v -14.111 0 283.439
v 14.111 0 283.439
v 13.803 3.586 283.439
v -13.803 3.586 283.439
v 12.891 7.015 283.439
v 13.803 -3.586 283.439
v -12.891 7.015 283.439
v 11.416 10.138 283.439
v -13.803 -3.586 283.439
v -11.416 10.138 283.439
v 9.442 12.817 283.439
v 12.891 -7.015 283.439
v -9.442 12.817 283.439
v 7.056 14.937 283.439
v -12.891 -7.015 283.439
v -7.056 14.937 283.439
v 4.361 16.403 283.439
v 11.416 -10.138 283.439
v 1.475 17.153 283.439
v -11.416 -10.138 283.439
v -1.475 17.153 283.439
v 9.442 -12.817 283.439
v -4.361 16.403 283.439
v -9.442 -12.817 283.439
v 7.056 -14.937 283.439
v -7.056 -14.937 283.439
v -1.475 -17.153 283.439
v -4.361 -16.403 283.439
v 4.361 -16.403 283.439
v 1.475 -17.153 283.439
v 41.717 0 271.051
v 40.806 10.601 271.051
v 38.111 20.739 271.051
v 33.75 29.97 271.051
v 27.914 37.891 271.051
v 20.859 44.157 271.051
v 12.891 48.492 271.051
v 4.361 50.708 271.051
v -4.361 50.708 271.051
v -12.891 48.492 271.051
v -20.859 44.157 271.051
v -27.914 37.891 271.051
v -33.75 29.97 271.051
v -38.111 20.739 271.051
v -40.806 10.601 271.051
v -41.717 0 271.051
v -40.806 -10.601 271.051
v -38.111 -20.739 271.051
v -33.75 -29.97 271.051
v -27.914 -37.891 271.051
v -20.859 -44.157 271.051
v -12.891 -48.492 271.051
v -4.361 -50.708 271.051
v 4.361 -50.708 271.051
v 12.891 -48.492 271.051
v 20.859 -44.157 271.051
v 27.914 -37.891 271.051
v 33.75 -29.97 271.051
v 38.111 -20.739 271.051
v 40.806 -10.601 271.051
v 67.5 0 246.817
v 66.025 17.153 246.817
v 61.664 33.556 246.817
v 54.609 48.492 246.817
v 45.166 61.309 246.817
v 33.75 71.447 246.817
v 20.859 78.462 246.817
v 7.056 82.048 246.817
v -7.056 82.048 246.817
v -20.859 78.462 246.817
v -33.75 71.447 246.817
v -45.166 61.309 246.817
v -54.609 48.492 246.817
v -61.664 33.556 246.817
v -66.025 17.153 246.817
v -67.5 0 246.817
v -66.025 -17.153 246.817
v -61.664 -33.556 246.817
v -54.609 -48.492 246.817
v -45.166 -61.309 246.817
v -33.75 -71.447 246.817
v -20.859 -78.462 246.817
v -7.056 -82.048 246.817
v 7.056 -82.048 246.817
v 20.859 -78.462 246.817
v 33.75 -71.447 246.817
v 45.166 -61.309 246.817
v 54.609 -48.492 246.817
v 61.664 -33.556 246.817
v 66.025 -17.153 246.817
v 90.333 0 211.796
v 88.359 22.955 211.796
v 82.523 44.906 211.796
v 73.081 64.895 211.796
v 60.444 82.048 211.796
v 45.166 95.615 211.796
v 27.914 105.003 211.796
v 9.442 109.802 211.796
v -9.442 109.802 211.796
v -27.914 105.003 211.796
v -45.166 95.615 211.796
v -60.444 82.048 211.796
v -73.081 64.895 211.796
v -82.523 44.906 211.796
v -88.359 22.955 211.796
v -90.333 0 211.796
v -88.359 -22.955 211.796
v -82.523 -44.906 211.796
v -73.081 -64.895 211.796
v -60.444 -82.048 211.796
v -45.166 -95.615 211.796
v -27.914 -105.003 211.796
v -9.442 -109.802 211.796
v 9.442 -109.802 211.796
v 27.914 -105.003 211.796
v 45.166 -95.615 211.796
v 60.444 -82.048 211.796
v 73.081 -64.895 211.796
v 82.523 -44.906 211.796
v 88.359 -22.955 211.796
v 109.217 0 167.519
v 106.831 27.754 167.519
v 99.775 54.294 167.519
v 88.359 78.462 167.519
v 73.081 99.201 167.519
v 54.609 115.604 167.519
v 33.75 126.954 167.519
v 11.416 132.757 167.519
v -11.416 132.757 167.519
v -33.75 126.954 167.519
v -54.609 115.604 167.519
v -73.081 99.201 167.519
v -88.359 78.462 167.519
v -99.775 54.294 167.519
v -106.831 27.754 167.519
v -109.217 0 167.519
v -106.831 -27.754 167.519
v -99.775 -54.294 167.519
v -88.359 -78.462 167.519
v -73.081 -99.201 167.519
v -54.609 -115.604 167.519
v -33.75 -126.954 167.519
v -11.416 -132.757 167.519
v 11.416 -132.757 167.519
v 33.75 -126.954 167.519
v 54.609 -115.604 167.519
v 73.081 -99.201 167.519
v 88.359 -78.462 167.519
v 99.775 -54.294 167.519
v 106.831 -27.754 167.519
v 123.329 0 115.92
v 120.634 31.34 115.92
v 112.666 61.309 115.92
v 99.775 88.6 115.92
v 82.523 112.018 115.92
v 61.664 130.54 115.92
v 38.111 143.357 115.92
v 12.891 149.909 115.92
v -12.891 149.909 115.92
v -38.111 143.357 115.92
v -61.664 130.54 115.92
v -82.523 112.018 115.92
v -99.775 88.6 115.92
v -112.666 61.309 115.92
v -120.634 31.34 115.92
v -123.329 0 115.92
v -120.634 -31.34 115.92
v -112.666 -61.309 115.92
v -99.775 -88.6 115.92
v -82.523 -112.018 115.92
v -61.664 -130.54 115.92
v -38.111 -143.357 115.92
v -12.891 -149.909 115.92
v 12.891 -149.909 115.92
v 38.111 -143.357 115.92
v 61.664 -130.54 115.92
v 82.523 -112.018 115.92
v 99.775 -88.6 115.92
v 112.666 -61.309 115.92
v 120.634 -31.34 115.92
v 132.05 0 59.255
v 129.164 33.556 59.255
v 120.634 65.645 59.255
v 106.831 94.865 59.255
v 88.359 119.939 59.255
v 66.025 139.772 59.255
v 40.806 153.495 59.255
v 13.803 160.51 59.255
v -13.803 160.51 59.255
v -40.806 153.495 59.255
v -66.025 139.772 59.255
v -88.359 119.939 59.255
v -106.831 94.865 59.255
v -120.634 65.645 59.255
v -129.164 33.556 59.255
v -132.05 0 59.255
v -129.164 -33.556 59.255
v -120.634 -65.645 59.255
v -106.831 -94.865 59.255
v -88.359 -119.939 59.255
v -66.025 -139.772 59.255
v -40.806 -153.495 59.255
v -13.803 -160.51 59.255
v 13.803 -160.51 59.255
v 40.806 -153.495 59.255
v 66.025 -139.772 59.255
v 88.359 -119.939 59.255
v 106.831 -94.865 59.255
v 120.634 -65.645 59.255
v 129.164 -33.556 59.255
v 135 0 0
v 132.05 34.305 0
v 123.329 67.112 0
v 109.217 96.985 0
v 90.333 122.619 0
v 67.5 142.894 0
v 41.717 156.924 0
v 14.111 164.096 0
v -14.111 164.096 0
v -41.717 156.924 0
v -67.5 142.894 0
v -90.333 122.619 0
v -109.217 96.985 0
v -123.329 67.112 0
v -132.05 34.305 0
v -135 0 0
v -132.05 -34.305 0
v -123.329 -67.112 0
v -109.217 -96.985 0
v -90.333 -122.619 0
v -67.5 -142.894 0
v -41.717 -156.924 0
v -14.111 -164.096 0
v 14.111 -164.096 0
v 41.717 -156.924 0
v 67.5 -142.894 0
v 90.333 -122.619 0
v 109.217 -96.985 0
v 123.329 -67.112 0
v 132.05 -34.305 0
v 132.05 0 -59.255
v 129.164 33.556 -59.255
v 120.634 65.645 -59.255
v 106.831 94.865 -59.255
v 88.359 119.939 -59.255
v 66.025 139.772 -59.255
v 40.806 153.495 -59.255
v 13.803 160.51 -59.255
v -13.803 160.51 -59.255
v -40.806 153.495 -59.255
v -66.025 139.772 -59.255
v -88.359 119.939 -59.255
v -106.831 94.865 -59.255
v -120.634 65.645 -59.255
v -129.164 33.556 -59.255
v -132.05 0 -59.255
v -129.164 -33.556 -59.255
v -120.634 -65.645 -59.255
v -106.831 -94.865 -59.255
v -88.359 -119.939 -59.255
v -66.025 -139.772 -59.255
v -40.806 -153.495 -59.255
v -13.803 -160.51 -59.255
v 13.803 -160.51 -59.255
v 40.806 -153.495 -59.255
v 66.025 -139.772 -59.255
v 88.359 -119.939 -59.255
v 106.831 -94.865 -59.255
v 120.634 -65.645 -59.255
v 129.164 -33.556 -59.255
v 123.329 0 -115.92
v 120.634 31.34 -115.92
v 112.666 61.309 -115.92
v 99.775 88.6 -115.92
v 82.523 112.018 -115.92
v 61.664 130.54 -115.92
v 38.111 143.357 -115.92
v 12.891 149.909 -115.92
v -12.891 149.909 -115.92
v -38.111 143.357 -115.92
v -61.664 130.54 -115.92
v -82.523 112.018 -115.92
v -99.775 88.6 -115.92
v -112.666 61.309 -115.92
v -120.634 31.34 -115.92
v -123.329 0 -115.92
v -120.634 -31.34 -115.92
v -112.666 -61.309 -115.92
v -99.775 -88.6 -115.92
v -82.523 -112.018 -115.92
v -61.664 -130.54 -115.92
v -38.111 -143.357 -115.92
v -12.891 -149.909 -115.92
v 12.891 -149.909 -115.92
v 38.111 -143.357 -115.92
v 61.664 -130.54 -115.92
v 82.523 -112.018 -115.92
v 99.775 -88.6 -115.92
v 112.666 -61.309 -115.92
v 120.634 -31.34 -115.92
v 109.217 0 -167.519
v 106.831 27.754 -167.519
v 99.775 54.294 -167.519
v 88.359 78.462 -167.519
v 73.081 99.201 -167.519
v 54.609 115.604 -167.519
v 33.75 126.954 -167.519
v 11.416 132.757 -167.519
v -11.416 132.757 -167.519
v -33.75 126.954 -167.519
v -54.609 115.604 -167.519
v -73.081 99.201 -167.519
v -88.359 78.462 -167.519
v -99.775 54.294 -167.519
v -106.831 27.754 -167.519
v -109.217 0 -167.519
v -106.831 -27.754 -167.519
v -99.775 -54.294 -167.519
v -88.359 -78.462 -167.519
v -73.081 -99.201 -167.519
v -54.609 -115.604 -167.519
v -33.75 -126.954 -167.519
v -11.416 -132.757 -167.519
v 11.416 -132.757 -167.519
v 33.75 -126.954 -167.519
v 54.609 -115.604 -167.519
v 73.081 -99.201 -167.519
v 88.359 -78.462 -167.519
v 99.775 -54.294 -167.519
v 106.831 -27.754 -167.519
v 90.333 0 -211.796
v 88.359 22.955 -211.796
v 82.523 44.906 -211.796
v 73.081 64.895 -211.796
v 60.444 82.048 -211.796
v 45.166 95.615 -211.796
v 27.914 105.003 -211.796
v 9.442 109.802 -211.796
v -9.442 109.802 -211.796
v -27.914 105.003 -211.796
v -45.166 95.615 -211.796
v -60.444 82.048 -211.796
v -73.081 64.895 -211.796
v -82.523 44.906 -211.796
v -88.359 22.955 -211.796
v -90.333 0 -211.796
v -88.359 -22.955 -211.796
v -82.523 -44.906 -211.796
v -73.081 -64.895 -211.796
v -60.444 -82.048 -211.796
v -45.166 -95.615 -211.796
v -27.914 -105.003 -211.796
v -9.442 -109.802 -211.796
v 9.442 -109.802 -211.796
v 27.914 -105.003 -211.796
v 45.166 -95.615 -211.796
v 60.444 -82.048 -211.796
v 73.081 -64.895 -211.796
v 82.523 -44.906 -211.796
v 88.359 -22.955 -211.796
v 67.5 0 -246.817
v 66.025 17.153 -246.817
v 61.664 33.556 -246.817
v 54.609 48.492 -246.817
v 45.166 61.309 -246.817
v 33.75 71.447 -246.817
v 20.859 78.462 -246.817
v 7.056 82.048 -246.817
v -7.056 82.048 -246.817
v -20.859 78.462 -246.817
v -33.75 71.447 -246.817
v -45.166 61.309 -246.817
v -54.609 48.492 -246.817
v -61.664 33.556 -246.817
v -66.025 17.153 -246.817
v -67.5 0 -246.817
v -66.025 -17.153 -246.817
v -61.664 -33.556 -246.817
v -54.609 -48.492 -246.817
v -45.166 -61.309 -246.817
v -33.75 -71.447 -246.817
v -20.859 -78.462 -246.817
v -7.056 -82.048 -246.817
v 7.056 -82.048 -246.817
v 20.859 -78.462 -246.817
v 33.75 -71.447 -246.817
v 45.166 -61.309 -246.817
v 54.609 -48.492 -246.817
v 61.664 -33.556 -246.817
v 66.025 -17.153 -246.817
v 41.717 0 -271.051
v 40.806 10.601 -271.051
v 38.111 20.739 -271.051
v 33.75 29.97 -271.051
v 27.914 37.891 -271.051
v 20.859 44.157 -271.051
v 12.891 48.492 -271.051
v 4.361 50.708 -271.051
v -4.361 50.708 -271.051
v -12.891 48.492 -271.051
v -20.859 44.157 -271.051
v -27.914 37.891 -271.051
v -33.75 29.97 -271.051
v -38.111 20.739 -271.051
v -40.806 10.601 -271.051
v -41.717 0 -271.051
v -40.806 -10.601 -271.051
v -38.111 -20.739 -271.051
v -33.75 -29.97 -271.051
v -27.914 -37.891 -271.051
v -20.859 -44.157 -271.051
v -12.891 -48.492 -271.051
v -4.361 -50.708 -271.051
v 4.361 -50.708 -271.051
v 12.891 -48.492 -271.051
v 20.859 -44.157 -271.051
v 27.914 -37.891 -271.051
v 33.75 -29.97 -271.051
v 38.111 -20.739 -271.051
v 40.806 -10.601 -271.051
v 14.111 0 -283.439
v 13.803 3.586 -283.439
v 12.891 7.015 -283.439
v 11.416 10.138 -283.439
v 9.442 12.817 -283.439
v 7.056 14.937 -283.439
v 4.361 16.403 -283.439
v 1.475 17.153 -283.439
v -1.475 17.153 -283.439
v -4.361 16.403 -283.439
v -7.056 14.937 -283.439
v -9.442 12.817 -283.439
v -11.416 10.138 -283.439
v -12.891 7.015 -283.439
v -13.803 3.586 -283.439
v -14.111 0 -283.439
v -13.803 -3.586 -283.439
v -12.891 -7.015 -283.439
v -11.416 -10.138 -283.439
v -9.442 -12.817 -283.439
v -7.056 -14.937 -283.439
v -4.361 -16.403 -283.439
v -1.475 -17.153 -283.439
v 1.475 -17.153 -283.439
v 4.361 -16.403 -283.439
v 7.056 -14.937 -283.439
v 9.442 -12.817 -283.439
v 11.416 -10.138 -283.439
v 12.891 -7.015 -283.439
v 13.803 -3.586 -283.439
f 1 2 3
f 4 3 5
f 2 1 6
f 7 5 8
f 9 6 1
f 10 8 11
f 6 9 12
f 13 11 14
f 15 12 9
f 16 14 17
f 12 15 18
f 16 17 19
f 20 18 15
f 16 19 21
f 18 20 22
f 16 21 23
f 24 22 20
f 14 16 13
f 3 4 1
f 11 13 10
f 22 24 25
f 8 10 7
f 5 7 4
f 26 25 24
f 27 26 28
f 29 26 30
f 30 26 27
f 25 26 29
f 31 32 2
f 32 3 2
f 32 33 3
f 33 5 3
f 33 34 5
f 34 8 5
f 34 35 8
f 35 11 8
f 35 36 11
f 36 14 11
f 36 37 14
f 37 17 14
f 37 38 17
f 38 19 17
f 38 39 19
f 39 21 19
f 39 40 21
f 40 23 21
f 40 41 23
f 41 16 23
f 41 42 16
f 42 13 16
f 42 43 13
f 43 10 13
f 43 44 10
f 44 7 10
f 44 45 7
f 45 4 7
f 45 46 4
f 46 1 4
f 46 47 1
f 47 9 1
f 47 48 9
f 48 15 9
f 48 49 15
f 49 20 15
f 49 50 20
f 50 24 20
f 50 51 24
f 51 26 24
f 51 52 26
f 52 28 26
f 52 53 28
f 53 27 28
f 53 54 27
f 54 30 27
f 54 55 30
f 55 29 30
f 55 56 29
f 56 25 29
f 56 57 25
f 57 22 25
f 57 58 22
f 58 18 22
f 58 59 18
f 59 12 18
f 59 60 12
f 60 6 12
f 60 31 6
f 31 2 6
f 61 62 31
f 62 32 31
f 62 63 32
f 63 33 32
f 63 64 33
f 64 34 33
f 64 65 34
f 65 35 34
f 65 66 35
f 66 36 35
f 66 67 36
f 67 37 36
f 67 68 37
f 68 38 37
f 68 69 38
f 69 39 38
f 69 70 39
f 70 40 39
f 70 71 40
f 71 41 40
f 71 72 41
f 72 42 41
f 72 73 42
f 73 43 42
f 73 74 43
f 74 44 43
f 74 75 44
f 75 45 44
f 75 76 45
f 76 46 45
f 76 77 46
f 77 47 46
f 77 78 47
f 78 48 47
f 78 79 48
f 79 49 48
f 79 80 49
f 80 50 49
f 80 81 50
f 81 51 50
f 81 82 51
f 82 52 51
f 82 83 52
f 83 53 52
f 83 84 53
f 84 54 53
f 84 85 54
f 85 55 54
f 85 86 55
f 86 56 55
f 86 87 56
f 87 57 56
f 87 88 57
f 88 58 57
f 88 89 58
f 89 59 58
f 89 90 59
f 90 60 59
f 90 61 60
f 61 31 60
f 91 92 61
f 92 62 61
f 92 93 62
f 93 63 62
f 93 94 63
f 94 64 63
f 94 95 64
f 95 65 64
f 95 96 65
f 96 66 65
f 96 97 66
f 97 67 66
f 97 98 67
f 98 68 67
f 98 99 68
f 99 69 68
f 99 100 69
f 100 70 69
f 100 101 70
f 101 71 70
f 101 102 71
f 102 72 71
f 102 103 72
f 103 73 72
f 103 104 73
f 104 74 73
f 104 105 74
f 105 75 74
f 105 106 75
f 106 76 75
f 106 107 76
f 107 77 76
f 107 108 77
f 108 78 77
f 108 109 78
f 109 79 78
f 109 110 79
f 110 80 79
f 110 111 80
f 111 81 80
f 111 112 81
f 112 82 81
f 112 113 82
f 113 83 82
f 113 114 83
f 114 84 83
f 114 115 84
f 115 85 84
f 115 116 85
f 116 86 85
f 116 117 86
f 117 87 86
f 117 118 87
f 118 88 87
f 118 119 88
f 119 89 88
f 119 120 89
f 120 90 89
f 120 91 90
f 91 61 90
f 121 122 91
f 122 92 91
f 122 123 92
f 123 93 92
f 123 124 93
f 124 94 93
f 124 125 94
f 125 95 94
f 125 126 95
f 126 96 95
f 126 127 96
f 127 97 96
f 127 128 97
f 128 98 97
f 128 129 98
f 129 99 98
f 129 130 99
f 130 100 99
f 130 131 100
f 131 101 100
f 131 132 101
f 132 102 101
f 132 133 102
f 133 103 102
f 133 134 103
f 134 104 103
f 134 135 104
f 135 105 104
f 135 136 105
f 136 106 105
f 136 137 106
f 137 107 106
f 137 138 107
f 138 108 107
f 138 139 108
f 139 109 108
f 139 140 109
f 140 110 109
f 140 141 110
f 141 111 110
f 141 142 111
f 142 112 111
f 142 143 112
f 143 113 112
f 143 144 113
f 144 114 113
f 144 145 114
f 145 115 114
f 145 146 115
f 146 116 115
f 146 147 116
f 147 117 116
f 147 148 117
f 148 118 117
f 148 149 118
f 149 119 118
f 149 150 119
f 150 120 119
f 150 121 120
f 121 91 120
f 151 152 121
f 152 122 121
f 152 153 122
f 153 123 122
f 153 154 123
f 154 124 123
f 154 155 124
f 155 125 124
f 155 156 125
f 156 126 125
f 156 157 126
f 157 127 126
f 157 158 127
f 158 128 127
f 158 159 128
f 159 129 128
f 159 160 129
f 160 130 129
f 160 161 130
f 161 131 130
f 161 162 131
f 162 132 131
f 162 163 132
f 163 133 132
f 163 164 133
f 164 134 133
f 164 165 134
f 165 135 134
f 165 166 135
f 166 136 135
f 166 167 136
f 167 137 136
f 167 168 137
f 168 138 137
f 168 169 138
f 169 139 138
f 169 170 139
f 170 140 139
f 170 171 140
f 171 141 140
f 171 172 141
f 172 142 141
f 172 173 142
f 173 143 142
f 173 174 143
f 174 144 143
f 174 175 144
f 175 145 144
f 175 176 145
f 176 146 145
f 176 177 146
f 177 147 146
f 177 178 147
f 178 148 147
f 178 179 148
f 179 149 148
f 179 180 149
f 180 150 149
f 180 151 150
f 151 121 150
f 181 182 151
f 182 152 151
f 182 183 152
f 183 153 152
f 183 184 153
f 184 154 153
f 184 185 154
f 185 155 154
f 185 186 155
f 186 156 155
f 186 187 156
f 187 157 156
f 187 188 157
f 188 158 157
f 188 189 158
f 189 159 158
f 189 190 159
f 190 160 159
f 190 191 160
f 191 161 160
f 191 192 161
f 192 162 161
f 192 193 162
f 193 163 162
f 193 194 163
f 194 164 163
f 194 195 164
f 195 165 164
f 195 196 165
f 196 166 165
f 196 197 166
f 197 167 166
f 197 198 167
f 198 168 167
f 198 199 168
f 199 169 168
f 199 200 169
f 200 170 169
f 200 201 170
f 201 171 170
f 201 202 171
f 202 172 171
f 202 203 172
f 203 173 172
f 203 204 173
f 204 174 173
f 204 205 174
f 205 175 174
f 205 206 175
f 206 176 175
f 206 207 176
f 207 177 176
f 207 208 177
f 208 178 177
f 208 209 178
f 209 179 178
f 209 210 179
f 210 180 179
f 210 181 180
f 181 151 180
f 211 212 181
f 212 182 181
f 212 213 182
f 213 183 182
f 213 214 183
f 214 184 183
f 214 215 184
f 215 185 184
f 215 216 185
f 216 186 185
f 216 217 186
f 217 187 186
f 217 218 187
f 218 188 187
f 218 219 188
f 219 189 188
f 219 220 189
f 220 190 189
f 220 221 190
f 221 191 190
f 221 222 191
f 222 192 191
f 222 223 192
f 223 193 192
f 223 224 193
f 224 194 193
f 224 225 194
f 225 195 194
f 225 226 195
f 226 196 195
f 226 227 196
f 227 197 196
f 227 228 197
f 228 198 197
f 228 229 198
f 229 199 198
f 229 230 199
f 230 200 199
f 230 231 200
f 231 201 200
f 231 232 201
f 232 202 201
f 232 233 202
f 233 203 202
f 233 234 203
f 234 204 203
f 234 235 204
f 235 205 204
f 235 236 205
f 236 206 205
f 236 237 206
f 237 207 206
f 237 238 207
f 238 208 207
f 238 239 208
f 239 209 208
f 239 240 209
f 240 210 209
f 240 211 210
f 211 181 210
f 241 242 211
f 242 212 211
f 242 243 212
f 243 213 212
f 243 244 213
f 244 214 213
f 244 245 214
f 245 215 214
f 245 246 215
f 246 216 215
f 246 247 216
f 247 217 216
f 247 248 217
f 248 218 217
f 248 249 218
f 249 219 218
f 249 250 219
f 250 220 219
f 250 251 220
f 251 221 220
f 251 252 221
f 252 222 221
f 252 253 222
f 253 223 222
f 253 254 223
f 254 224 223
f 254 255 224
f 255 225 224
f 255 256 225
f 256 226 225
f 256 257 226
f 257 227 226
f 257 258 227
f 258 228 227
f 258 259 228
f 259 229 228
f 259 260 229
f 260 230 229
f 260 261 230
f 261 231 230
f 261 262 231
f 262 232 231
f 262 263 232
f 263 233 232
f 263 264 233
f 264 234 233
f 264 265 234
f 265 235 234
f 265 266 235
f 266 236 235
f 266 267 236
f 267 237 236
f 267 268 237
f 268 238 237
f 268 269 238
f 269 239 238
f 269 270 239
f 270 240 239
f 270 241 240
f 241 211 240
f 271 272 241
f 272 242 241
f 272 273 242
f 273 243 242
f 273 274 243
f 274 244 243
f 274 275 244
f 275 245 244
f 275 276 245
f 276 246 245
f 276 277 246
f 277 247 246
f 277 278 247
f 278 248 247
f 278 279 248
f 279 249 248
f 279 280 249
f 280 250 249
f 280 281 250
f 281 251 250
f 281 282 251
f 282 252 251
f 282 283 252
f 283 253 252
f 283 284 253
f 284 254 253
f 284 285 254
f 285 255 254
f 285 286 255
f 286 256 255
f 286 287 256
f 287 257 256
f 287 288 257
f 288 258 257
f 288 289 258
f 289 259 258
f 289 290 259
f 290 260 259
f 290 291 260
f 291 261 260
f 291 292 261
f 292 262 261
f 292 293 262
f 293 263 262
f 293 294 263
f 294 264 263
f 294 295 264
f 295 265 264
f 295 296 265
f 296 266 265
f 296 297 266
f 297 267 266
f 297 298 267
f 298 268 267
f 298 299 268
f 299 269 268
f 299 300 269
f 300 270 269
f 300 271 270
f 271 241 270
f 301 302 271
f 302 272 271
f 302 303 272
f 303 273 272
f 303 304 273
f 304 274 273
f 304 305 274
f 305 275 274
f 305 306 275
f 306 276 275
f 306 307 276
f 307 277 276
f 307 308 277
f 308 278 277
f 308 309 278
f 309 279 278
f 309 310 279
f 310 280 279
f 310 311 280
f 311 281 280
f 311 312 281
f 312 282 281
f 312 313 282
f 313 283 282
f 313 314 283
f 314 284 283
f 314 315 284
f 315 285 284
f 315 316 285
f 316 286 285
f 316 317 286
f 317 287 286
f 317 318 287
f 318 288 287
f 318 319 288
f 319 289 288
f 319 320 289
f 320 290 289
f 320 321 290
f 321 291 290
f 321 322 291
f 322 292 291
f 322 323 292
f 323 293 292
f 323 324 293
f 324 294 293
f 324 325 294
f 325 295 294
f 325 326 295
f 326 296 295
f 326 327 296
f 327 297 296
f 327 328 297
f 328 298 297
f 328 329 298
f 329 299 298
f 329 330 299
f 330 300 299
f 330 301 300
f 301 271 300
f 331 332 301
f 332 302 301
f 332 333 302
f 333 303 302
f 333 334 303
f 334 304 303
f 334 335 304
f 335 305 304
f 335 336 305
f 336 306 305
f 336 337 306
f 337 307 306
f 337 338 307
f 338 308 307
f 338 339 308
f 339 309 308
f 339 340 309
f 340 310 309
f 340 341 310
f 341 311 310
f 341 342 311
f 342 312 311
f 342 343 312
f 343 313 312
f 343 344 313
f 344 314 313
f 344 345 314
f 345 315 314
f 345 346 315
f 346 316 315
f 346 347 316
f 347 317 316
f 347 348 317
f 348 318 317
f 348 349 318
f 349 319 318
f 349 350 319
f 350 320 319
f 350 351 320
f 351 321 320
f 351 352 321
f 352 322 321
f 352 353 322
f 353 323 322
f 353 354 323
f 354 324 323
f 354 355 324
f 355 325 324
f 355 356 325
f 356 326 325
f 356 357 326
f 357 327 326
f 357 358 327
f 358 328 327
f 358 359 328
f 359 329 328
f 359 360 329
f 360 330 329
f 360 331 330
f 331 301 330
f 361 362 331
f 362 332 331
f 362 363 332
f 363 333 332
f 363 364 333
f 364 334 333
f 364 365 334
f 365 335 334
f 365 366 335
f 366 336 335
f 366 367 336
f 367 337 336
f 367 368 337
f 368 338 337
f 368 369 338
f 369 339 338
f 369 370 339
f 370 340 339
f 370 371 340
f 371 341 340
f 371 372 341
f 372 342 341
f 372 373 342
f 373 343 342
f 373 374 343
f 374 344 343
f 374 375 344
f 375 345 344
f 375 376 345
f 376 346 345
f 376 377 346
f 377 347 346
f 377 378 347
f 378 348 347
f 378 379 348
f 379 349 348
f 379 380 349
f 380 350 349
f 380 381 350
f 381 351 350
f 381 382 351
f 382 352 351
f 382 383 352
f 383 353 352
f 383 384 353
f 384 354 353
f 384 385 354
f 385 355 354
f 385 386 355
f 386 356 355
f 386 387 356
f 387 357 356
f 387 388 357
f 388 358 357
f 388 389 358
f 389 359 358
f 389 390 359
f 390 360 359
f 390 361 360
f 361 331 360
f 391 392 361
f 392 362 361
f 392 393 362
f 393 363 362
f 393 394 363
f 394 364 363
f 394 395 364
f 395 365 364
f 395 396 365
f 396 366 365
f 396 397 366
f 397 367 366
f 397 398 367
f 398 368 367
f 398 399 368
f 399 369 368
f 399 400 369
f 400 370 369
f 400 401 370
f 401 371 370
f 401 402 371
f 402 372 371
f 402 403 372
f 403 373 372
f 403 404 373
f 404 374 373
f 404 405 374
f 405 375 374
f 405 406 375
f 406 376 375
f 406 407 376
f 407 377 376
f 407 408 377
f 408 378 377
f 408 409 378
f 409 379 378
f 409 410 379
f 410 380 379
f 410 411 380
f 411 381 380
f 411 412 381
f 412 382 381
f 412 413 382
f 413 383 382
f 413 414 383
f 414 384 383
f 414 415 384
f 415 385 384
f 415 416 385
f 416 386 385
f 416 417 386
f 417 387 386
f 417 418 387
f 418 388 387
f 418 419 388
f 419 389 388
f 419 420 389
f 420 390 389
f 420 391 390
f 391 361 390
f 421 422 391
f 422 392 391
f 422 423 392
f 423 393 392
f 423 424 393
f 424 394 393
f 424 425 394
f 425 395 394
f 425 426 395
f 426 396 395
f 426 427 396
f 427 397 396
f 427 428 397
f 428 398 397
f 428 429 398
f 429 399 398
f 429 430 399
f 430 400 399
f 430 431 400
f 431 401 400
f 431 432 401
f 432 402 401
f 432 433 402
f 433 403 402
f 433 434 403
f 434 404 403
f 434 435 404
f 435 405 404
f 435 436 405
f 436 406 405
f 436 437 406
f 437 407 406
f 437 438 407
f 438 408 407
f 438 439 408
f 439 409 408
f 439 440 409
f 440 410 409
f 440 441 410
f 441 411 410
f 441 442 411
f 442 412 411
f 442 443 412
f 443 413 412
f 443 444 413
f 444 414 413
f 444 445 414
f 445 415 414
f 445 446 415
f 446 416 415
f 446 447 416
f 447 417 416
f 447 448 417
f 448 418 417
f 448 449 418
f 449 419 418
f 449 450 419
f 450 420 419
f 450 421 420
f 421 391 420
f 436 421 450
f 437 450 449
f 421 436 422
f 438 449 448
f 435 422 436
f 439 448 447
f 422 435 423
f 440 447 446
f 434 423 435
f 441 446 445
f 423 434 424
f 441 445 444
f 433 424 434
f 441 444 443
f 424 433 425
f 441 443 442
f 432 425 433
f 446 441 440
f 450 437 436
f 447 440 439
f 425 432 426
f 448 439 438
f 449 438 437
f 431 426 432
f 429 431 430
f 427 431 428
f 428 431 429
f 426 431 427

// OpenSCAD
// Generated by SolidPython 1.0.1 on 2020-07-29 00:46:48


scale(v = [9, 11, 19]) {
	sphere(r = 15);
}
/***********************************************
*********      SolidPython code:      **********
************************************************
 
# import packages: SolidPython
from solid import *
from solid.utils import *
from itertools import chain, combinations, permutations


class Resize:

    def __init__(self, scad_file):
        self.scad_file = scad_file
        #self.scad_file = import_scad(scad_file)
        # cone/cylinder param:
        self.r1 = 0
        self.r2 = 0
        self.h = 0
        # rectangular prism param:
        self.w = 0
        self.l = 0
        # ellipse param:
        self.r = 0

    # import OpenScad code (file name corresponds to shape)


    # classify shape + parameters
    def assign(self, param1, param2, param3):
        if self.scad_file == 'cone.scad':
            self.r1 = param1
            self.r2 = param2
            self.h = param3
        elif self.scad_file == 'cylinder.scad':
            self.r1 = param1
            self.r2 = param2
            self.h = param3
        elif self.scad_file == 'rectangularPrism.scad':
            self.h = param1
            self.l = param2
            self.w = param3
        else:
            self.r = param1
            self.h = param2

    # resize parameters
    def iterate(self):
        x = range(3, 20, 2)
        i = 1
        if self.scad_file == 'cone.scad':
            tempList = list(permutations(x, 2))
            for temp in tempList:
                param1 = temp[0]
                param2 = temp[1]
                filepath = 'produced_scad_files/' + 'cone' + str(param1) + '_' + str(param2) + '_' + '.scad'
                scad_render_to_file(cylinder(h=param1, r1=param2, r2=0), filepath)

        elif self.scad_file == 'cylinder.scad':
            tempList = list(permutations(x, 3))
            for temp in tempList:
                param1 = temp[0]
                param2 = temp[1]
                filepath = 'produced_scad_files/' + 'cylinder' + str(param1) + '_' + str(param2) + '_' + '.scad'
                scad_render_to_file(cylinder(h=param1, r1=param2, r2=param2), filepath)

        elif self.scad_file == 'rectangularPrism.scad':
            tempList = list(permutations(x, 3))
            for temp in tempList:
                param1 = temp[0]
                param2 = temp[1]
                param3 = temp[2]
                filepath = 'produced_scad_files/' + 'rectangularPrism' + str(param1) + '_' + str(param2) + '_' + str(
                    param3) + '.scad'
                scad_render_to_file(cube(size=(param1, param2, param3)), filepath)

        elif self.scad_file == 'ellipse.scad':
            tempList = list(permutations(x, 4))
            for temp in tempList:
                param1 = temp[0]
                param2 = temp[1]
                param3 = temp[2]
                param4 = temp[3]
                filepath = 'produced_scad_files/' + 'ellipse' + str(param1) + '_' + str(param2) + '_' + str(param3) + '_' + str(param4) + '.scad'
                scad_render_to_file(scale([param1, param2, param3])(sphere(r=param4)), filepath)

    def render_to_scadfile(self):
        scad_render_to_file(scad, 'example.scad') 
 
************************************************/
